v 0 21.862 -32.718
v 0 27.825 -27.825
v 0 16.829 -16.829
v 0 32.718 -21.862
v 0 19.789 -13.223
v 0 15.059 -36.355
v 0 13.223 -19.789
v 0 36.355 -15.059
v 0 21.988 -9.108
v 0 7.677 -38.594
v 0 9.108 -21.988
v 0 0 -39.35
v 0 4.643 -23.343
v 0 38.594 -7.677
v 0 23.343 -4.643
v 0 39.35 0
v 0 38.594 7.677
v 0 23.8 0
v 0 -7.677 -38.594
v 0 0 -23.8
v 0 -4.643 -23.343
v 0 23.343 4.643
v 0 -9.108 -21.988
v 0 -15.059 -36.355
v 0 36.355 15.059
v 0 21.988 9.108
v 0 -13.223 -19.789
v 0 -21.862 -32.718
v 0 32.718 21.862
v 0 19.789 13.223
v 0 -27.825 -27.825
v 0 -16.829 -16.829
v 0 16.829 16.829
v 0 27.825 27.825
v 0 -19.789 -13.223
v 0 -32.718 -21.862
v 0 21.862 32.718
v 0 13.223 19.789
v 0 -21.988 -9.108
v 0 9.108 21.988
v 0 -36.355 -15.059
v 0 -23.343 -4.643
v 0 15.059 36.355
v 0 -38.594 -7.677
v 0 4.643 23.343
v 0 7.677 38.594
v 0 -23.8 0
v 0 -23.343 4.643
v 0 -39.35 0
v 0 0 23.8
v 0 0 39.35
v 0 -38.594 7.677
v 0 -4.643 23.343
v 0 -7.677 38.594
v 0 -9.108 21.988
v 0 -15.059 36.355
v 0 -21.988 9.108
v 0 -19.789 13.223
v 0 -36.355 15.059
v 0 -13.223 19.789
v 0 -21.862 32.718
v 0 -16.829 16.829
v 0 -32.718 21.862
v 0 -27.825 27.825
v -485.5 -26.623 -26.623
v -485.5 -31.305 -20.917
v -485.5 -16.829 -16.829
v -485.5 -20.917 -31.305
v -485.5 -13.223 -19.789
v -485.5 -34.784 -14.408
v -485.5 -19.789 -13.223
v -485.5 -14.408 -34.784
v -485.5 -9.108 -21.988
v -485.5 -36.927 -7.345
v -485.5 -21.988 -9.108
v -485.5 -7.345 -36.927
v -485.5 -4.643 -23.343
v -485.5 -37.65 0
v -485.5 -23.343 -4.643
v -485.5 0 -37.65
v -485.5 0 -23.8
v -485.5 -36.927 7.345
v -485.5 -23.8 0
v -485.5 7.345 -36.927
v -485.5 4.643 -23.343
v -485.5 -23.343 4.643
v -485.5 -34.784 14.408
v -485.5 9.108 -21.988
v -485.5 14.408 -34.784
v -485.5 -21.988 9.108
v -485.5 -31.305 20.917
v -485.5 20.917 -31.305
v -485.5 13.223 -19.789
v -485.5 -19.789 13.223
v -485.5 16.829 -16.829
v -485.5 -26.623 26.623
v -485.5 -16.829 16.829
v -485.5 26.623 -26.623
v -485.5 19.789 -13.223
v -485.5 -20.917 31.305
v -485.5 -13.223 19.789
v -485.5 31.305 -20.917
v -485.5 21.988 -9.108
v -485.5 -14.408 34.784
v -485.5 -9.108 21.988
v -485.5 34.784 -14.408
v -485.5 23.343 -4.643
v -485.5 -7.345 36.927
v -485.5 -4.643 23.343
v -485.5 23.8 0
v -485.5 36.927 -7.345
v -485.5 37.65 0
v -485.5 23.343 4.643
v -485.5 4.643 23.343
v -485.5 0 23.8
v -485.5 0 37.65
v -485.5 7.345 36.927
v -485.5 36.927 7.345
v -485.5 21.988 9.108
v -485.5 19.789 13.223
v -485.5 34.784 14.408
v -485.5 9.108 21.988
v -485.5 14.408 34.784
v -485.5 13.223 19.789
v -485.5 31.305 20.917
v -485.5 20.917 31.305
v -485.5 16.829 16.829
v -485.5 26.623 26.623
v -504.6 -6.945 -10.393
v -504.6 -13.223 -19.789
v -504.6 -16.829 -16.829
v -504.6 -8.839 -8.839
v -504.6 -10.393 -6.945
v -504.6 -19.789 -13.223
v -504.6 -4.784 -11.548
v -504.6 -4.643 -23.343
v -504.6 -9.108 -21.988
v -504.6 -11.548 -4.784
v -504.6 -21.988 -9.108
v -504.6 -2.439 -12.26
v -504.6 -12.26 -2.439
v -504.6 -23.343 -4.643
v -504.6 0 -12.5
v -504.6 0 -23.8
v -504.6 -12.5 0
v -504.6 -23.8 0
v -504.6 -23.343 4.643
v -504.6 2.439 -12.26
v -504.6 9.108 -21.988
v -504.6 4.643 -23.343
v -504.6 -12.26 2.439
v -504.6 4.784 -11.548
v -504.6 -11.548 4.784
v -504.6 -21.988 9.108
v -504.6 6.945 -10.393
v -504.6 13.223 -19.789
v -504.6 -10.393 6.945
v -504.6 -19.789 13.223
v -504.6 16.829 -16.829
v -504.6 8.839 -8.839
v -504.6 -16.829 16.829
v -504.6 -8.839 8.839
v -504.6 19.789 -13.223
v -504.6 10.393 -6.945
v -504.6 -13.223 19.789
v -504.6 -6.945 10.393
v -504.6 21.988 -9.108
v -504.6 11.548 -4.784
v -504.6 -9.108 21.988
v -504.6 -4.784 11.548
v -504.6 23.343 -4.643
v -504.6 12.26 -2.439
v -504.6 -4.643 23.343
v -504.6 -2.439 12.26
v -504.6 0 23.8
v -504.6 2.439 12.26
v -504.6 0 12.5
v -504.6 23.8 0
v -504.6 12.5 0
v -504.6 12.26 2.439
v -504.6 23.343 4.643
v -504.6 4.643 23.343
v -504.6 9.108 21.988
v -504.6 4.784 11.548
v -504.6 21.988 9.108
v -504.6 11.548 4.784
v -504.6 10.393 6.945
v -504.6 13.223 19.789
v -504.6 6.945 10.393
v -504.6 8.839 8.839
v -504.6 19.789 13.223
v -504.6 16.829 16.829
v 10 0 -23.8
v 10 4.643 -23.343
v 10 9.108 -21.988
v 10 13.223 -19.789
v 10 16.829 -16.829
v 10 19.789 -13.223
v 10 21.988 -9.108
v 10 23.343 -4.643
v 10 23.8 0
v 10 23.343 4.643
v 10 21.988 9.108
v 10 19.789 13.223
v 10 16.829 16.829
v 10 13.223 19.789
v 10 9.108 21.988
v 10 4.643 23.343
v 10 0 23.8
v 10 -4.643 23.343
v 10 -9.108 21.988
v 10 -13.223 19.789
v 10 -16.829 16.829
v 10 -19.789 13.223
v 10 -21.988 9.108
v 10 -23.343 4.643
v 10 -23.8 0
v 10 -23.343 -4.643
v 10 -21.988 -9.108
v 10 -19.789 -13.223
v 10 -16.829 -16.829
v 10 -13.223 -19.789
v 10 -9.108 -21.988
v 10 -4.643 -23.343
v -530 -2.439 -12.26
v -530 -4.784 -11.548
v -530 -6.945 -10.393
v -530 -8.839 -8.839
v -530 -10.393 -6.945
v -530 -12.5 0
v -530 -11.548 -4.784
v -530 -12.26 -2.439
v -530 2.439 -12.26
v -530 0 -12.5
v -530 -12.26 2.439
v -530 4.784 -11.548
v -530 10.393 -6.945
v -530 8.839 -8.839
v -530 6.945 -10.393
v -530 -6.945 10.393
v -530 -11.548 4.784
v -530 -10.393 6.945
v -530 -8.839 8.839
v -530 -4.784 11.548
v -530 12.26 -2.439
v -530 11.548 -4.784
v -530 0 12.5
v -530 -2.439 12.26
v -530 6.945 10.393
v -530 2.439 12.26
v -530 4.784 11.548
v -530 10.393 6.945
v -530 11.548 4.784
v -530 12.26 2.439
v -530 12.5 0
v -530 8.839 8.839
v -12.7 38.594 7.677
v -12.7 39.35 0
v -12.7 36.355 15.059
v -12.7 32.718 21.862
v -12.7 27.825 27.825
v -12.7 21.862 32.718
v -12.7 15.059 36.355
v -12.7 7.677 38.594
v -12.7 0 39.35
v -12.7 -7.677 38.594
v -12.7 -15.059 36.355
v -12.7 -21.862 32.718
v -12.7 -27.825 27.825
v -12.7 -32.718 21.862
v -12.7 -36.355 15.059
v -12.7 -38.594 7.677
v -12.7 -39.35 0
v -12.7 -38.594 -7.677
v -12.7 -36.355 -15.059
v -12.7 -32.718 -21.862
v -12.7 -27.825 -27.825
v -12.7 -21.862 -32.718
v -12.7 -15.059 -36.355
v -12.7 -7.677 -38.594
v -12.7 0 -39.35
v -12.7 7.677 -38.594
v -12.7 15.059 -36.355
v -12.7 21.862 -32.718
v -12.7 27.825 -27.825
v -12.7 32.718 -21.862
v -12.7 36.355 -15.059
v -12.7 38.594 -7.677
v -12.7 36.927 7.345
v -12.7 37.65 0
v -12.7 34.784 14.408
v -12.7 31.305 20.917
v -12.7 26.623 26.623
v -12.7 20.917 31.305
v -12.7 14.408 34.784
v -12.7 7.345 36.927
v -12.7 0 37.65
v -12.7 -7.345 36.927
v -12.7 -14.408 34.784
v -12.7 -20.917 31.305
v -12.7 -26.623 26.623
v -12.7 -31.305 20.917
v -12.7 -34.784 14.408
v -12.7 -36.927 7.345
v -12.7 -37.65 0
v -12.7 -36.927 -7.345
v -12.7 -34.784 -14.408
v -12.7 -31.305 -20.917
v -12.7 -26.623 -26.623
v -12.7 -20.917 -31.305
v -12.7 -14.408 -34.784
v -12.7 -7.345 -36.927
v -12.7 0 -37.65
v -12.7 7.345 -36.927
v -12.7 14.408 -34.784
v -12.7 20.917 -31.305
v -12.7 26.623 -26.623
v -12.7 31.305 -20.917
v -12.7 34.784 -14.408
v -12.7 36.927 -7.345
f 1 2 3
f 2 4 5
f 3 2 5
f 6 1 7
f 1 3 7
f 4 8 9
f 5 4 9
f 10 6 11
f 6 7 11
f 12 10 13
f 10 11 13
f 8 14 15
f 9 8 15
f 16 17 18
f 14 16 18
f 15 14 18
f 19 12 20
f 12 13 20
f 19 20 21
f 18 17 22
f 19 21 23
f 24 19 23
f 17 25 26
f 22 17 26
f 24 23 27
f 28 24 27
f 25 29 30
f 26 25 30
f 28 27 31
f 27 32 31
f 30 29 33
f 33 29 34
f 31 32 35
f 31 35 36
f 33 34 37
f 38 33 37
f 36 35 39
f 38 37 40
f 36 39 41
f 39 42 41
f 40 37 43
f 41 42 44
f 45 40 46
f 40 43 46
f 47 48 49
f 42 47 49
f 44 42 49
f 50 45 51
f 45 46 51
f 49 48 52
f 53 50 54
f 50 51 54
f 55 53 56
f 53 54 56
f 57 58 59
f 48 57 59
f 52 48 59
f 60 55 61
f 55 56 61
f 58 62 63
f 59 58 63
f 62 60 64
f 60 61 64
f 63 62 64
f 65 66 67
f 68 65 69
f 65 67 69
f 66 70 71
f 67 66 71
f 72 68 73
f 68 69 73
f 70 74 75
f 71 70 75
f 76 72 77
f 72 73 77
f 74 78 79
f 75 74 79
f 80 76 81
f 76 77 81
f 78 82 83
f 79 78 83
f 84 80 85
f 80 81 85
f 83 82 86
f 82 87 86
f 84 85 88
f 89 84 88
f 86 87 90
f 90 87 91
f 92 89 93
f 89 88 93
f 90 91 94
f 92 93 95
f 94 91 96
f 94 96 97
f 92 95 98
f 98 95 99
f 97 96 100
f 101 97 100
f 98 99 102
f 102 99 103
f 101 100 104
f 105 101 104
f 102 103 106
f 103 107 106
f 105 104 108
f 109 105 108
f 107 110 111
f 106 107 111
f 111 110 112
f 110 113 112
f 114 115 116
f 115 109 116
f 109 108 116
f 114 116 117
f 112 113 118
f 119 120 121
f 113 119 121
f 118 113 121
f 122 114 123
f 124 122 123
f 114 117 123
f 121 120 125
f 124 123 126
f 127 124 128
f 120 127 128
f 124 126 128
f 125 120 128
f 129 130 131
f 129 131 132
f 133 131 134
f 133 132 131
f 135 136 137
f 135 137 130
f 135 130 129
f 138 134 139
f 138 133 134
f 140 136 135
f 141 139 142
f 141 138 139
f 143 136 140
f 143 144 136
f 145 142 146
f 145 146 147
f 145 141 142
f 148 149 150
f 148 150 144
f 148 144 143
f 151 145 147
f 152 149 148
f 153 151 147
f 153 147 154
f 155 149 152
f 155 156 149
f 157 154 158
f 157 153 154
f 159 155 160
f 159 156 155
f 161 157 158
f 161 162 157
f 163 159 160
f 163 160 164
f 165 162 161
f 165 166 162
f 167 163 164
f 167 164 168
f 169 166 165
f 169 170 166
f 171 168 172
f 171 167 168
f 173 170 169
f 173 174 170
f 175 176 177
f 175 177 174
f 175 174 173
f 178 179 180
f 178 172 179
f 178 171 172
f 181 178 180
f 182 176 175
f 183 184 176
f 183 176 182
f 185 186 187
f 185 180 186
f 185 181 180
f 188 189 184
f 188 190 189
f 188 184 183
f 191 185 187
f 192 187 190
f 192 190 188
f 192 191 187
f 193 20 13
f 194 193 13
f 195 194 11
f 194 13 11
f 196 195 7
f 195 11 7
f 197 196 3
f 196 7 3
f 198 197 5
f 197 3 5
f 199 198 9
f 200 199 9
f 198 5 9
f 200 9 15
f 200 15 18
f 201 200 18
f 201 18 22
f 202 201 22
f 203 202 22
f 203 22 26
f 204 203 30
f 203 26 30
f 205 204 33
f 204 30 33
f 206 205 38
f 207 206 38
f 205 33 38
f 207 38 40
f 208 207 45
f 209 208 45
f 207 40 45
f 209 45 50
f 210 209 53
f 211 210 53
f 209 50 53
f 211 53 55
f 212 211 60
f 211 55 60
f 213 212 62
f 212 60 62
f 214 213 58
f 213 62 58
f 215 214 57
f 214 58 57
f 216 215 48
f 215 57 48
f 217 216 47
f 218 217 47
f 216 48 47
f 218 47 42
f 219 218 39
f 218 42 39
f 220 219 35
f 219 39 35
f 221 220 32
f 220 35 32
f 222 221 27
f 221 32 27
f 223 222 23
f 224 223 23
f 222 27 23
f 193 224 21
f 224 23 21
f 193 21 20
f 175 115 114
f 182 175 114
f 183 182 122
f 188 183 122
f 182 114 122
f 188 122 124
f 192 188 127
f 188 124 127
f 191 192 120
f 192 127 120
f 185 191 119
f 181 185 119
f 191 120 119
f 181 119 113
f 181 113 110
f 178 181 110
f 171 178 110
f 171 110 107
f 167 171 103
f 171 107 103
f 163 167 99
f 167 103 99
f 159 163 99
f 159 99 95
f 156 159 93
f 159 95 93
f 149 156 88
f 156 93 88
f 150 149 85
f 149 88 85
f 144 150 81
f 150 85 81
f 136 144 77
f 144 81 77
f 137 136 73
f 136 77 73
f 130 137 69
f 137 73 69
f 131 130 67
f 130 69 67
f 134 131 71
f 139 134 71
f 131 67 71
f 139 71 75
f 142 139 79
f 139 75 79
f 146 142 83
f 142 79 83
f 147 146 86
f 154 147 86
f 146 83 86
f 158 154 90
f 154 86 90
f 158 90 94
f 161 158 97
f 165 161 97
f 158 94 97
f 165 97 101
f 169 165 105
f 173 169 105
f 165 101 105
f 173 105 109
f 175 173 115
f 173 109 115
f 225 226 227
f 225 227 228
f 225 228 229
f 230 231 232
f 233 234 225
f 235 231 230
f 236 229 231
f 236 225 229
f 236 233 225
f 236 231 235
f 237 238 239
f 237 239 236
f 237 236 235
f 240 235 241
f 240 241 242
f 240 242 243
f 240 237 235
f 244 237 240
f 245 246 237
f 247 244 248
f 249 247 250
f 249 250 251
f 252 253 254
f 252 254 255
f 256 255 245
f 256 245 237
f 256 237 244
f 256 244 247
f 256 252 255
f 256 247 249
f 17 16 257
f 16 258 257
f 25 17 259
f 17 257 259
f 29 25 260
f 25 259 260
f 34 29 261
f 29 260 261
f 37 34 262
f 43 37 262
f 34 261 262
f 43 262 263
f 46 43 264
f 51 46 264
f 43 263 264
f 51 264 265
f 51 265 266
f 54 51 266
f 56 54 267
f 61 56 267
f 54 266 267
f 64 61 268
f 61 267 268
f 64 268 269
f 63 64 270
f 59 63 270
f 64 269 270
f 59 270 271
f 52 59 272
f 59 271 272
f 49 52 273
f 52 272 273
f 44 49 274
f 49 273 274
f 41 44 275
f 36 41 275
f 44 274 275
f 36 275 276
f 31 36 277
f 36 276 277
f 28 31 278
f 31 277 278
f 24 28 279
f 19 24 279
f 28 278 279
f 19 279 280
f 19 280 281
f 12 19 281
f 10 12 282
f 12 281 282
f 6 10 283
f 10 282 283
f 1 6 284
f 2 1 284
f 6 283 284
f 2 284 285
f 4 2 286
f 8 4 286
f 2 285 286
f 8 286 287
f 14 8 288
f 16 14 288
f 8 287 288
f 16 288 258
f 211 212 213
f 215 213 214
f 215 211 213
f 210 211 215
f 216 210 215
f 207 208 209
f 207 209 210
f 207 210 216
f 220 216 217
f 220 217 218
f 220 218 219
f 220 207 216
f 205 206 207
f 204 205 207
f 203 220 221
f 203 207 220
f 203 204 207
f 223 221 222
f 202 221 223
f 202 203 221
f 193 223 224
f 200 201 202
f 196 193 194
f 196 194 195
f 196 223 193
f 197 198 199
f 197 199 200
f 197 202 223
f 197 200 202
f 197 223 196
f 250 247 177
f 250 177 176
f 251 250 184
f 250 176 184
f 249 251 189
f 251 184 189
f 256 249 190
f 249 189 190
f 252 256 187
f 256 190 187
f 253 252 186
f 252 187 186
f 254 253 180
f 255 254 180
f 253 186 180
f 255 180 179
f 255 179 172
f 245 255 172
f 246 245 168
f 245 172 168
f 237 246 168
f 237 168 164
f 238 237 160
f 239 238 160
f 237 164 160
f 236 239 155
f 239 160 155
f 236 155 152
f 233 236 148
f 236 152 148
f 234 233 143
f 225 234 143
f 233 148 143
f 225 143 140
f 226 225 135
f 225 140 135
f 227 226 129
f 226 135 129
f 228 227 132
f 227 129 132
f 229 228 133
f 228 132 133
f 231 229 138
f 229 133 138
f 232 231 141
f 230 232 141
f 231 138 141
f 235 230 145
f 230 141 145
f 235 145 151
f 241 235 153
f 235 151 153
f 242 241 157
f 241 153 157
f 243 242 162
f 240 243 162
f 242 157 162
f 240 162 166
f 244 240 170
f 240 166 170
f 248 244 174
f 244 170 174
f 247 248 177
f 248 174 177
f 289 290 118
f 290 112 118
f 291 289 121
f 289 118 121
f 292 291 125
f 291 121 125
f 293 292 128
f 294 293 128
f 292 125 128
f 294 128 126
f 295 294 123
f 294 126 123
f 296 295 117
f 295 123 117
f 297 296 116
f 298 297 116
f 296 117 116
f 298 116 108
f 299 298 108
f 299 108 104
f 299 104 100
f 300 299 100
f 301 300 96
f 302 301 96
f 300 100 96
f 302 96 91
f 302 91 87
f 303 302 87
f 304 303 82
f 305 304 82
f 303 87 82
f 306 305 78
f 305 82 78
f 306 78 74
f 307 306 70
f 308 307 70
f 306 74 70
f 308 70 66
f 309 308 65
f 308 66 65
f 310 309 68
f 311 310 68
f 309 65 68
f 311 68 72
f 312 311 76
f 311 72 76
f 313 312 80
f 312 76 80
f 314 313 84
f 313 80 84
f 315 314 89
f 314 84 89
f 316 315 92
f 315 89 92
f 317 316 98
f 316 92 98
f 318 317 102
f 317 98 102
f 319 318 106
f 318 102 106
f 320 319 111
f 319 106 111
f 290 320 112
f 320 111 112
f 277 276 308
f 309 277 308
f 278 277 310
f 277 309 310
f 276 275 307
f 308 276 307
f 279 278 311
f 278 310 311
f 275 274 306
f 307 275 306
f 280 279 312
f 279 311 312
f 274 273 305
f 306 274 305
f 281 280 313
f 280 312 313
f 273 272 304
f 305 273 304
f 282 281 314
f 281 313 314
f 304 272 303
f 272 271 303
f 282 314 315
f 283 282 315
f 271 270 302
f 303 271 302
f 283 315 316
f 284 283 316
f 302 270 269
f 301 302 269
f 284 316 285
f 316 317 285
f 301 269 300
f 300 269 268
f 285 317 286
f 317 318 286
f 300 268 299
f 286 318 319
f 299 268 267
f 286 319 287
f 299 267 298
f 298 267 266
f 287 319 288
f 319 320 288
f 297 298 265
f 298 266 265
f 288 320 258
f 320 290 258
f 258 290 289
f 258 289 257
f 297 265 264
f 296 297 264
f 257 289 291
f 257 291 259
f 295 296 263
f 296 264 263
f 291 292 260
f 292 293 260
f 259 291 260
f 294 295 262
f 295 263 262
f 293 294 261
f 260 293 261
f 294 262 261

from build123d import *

# Parameters (mm, degrees)
ESQUISSE4_R        = 23.8
BOSS_EXTRU_2_DEPTH = 19.1
ESQUISSE8_R        = 12.5
BOSS_EXTRU_3_DEPTH = 25.4
ESQUISSE9_R        = 23.8
BOSS_EXTRU_4_DEPTH = 10


with BuildPart() as part:
    # Esquisse3 → Révolution1 (revolve)
    with BuildSketch(Plane.XY):
        Polygon((0, 0), (0, 39.35), (-12.7, 39.35), (-12.7, 37.65), (-485.5, 37.65), (-485.5, 0), align=None)
    revolve(axis=Axis((-619.271971496, 0, 0), (1, 0, 0)))

    # Esquisse4 → Boss.-Extru.2 (add)
    with BuildSketch(Plane.ZY.offset(485.5)):
        Circle(ESQUISSE4_R)
    extrude(amount=BOSS_EXTRU_2_DEPTH)

    # Esquisse8 → Boss.-Extru.3 (add)
    with BuildSketch(Plane.ZY.offset(504.6)):
        Circle(ESQUISSE8_R)
    extrude(amount=BOSS_EXTRU_3_DEPTH)

    # Esquisse9 → Boss.-Extru.4 (add)
    with BuildSketch(Plane(origin=(0, 0, 0), x_dir=(0, 0, -1), z_dir=(1, 0, 0))):
        Circle(ESQUISSE9_R)
    extrude(amount=BOSS_EXTRU_4_DEPTH)


solid = part.part
